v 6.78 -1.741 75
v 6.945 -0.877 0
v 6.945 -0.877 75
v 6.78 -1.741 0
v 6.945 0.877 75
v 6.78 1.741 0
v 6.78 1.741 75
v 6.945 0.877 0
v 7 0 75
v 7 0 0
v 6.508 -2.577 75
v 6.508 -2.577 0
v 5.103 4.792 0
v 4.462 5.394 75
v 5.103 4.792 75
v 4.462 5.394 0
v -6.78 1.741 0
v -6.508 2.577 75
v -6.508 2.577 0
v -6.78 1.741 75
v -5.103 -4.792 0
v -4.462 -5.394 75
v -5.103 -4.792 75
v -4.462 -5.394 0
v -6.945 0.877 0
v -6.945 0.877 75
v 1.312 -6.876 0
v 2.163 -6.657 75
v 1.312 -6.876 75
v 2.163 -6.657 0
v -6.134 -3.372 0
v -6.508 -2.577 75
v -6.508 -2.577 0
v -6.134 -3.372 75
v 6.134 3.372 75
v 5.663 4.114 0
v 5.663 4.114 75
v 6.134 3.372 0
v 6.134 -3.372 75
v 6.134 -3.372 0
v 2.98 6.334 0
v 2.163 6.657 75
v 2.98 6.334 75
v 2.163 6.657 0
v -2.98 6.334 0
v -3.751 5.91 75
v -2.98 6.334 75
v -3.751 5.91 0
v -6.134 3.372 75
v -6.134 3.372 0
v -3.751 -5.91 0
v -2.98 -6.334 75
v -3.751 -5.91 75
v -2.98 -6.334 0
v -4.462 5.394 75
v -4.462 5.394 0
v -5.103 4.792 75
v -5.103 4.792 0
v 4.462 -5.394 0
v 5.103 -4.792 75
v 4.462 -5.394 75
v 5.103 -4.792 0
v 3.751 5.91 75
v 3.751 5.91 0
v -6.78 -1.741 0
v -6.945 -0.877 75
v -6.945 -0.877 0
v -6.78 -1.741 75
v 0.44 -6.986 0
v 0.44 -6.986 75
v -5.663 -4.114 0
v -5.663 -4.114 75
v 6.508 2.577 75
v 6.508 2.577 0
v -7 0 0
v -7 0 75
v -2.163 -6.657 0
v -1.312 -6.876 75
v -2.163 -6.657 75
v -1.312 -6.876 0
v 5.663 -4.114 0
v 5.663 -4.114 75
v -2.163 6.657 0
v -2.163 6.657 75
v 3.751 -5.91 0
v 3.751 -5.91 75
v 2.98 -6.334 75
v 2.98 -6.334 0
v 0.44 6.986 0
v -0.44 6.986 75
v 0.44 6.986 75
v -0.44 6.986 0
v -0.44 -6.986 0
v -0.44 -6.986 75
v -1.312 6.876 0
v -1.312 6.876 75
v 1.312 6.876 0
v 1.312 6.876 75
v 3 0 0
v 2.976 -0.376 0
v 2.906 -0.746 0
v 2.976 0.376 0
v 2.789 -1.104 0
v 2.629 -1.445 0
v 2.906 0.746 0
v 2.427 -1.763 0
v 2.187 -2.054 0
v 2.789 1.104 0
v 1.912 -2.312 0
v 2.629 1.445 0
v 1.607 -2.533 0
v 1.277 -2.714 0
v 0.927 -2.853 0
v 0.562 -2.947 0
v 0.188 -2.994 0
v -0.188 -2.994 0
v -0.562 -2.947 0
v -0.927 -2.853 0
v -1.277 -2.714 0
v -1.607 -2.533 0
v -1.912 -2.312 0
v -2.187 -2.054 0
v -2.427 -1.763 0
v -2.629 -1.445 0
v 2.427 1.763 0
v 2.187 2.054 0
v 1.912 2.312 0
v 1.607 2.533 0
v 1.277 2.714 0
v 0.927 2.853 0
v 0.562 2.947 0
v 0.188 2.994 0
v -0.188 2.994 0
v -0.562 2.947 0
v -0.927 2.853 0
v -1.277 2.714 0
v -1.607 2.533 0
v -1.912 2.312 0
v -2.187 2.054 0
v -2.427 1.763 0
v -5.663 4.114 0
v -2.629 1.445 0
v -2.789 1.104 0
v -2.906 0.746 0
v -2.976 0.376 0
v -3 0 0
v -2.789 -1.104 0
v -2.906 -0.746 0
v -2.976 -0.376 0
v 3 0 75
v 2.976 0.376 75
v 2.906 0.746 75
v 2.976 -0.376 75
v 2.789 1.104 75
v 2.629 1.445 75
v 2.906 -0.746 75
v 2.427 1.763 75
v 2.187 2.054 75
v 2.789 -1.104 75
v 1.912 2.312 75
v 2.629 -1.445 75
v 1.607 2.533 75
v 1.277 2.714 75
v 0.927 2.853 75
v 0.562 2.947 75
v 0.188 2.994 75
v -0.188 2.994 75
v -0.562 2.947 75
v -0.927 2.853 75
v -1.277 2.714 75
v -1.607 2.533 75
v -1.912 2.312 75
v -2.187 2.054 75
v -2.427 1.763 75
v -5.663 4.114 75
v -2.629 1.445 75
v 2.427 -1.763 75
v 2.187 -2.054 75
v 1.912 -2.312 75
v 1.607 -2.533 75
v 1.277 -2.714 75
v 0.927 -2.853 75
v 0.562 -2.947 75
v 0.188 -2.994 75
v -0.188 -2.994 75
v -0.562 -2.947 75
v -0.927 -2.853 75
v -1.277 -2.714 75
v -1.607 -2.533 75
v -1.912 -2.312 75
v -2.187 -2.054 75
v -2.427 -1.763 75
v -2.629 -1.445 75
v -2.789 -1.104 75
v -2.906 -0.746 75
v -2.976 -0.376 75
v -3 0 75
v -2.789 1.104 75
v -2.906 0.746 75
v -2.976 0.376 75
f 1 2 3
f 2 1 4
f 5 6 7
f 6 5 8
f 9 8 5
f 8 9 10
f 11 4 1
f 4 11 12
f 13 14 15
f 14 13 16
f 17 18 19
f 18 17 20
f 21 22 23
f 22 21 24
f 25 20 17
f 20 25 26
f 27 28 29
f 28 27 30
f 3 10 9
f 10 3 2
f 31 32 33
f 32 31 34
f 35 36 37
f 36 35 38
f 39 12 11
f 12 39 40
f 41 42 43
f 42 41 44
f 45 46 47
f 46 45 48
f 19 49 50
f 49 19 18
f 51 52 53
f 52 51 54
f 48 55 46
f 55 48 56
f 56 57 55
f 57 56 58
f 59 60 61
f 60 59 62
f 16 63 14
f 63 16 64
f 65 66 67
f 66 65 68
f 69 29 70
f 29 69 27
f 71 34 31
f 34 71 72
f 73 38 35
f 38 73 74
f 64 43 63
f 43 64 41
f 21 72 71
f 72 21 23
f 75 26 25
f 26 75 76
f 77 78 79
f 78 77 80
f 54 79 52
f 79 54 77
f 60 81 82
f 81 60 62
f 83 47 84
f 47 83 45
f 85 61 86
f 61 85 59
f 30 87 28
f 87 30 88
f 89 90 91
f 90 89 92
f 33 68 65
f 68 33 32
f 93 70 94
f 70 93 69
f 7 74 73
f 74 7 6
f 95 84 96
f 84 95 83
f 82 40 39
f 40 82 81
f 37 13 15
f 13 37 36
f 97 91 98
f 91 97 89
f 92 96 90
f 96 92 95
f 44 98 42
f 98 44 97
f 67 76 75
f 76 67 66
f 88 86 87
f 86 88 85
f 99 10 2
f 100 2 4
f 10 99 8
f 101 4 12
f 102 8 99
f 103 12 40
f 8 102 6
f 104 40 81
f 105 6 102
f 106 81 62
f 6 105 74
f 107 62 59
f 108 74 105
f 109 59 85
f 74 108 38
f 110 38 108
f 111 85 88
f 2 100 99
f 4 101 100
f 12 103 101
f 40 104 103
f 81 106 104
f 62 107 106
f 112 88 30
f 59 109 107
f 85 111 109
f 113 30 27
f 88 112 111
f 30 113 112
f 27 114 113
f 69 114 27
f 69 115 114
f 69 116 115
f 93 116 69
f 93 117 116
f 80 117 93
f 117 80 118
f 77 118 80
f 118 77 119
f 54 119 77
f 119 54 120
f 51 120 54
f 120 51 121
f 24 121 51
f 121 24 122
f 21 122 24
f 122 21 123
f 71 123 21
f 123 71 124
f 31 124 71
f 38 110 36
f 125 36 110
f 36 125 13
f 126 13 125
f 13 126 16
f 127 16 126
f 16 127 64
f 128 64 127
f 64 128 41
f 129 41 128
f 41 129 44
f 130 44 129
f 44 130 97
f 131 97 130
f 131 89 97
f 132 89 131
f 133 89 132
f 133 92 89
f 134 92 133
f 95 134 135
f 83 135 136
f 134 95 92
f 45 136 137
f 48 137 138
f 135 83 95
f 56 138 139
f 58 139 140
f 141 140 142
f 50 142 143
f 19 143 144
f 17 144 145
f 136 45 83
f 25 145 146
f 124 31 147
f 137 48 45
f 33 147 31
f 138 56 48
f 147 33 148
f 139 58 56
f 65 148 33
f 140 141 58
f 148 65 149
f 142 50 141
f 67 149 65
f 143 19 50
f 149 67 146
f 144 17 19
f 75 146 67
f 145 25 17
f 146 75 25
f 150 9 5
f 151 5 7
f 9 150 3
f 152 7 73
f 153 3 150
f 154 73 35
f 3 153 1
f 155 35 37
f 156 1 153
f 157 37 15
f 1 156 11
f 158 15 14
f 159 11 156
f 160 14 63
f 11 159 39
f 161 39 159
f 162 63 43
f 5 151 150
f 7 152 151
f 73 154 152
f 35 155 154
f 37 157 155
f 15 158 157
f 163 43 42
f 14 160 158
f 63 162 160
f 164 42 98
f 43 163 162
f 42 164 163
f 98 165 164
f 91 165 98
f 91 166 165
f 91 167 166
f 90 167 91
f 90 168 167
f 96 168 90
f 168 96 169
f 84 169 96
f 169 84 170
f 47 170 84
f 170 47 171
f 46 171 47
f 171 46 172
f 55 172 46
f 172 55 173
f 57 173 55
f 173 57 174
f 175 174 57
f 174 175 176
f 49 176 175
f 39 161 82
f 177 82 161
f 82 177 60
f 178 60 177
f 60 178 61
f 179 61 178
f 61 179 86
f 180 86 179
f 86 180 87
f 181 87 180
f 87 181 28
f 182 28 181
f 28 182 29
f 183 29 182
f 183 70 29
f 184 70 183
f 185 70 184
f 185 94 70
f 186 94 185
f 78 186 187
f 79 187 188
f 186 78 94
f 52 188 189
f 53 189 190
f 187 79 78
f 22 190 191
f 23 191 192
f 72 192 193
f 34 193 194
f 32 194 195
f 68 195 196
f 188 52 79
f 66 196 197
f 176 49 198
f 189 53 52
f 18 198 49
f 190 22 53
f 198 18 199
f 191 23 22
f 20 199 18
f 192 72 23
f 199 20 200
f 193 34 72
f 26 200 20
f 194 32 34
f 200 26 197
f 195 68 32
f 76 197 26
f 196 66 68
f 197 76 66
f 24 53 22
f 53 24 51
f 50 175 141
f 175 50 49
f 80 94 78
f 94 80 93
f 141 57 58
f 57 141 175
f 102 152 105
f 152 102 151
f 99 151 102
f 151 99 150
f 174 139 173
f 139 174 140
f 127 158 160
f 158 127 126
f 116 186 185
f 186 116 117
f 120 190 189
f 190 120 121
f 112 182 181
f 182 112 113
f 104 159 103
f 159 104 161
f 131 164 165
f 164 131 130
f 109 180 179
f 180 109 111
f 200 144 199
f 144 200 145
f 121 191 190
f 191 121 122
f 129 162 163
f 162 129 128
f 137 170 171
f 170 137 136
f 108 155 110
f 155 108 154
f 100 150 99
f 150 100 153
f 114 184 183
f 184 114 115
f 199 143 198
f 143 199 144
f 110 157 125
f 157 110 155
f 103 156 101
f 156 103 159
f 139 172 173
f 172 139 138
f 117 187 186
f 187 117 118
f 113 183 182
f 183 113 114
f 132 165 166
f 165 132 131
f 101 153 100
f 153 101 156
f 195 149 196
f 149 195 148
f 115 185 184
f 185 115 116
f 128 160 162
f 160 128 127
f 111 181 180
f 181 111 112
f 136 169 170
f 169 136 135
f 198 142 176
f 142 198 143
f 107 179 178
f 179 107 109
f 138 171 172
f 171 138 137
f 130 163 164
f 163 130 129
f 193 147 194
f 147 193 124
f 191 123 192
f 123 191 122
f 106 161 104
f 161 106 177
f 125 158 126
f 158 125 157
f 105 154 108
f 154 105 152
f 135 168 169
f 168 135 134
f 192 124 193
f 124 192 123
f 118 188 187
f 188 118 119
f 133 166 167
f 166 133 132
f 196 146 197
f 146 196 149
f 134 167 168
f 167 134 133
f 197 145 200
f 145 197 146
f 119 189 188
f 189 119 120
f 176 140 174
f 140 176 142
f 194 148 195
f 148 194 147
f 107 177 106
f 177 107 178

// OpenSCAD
$fn = 50;


difference() {
	union() {
		cylinder(h = 75, r = 7.0000000000);
	}
	union() {
		translate(v = [0, 0, -100]) {
			cylinder(h = 200, r = 3.0000000000);
		}
	}
}
